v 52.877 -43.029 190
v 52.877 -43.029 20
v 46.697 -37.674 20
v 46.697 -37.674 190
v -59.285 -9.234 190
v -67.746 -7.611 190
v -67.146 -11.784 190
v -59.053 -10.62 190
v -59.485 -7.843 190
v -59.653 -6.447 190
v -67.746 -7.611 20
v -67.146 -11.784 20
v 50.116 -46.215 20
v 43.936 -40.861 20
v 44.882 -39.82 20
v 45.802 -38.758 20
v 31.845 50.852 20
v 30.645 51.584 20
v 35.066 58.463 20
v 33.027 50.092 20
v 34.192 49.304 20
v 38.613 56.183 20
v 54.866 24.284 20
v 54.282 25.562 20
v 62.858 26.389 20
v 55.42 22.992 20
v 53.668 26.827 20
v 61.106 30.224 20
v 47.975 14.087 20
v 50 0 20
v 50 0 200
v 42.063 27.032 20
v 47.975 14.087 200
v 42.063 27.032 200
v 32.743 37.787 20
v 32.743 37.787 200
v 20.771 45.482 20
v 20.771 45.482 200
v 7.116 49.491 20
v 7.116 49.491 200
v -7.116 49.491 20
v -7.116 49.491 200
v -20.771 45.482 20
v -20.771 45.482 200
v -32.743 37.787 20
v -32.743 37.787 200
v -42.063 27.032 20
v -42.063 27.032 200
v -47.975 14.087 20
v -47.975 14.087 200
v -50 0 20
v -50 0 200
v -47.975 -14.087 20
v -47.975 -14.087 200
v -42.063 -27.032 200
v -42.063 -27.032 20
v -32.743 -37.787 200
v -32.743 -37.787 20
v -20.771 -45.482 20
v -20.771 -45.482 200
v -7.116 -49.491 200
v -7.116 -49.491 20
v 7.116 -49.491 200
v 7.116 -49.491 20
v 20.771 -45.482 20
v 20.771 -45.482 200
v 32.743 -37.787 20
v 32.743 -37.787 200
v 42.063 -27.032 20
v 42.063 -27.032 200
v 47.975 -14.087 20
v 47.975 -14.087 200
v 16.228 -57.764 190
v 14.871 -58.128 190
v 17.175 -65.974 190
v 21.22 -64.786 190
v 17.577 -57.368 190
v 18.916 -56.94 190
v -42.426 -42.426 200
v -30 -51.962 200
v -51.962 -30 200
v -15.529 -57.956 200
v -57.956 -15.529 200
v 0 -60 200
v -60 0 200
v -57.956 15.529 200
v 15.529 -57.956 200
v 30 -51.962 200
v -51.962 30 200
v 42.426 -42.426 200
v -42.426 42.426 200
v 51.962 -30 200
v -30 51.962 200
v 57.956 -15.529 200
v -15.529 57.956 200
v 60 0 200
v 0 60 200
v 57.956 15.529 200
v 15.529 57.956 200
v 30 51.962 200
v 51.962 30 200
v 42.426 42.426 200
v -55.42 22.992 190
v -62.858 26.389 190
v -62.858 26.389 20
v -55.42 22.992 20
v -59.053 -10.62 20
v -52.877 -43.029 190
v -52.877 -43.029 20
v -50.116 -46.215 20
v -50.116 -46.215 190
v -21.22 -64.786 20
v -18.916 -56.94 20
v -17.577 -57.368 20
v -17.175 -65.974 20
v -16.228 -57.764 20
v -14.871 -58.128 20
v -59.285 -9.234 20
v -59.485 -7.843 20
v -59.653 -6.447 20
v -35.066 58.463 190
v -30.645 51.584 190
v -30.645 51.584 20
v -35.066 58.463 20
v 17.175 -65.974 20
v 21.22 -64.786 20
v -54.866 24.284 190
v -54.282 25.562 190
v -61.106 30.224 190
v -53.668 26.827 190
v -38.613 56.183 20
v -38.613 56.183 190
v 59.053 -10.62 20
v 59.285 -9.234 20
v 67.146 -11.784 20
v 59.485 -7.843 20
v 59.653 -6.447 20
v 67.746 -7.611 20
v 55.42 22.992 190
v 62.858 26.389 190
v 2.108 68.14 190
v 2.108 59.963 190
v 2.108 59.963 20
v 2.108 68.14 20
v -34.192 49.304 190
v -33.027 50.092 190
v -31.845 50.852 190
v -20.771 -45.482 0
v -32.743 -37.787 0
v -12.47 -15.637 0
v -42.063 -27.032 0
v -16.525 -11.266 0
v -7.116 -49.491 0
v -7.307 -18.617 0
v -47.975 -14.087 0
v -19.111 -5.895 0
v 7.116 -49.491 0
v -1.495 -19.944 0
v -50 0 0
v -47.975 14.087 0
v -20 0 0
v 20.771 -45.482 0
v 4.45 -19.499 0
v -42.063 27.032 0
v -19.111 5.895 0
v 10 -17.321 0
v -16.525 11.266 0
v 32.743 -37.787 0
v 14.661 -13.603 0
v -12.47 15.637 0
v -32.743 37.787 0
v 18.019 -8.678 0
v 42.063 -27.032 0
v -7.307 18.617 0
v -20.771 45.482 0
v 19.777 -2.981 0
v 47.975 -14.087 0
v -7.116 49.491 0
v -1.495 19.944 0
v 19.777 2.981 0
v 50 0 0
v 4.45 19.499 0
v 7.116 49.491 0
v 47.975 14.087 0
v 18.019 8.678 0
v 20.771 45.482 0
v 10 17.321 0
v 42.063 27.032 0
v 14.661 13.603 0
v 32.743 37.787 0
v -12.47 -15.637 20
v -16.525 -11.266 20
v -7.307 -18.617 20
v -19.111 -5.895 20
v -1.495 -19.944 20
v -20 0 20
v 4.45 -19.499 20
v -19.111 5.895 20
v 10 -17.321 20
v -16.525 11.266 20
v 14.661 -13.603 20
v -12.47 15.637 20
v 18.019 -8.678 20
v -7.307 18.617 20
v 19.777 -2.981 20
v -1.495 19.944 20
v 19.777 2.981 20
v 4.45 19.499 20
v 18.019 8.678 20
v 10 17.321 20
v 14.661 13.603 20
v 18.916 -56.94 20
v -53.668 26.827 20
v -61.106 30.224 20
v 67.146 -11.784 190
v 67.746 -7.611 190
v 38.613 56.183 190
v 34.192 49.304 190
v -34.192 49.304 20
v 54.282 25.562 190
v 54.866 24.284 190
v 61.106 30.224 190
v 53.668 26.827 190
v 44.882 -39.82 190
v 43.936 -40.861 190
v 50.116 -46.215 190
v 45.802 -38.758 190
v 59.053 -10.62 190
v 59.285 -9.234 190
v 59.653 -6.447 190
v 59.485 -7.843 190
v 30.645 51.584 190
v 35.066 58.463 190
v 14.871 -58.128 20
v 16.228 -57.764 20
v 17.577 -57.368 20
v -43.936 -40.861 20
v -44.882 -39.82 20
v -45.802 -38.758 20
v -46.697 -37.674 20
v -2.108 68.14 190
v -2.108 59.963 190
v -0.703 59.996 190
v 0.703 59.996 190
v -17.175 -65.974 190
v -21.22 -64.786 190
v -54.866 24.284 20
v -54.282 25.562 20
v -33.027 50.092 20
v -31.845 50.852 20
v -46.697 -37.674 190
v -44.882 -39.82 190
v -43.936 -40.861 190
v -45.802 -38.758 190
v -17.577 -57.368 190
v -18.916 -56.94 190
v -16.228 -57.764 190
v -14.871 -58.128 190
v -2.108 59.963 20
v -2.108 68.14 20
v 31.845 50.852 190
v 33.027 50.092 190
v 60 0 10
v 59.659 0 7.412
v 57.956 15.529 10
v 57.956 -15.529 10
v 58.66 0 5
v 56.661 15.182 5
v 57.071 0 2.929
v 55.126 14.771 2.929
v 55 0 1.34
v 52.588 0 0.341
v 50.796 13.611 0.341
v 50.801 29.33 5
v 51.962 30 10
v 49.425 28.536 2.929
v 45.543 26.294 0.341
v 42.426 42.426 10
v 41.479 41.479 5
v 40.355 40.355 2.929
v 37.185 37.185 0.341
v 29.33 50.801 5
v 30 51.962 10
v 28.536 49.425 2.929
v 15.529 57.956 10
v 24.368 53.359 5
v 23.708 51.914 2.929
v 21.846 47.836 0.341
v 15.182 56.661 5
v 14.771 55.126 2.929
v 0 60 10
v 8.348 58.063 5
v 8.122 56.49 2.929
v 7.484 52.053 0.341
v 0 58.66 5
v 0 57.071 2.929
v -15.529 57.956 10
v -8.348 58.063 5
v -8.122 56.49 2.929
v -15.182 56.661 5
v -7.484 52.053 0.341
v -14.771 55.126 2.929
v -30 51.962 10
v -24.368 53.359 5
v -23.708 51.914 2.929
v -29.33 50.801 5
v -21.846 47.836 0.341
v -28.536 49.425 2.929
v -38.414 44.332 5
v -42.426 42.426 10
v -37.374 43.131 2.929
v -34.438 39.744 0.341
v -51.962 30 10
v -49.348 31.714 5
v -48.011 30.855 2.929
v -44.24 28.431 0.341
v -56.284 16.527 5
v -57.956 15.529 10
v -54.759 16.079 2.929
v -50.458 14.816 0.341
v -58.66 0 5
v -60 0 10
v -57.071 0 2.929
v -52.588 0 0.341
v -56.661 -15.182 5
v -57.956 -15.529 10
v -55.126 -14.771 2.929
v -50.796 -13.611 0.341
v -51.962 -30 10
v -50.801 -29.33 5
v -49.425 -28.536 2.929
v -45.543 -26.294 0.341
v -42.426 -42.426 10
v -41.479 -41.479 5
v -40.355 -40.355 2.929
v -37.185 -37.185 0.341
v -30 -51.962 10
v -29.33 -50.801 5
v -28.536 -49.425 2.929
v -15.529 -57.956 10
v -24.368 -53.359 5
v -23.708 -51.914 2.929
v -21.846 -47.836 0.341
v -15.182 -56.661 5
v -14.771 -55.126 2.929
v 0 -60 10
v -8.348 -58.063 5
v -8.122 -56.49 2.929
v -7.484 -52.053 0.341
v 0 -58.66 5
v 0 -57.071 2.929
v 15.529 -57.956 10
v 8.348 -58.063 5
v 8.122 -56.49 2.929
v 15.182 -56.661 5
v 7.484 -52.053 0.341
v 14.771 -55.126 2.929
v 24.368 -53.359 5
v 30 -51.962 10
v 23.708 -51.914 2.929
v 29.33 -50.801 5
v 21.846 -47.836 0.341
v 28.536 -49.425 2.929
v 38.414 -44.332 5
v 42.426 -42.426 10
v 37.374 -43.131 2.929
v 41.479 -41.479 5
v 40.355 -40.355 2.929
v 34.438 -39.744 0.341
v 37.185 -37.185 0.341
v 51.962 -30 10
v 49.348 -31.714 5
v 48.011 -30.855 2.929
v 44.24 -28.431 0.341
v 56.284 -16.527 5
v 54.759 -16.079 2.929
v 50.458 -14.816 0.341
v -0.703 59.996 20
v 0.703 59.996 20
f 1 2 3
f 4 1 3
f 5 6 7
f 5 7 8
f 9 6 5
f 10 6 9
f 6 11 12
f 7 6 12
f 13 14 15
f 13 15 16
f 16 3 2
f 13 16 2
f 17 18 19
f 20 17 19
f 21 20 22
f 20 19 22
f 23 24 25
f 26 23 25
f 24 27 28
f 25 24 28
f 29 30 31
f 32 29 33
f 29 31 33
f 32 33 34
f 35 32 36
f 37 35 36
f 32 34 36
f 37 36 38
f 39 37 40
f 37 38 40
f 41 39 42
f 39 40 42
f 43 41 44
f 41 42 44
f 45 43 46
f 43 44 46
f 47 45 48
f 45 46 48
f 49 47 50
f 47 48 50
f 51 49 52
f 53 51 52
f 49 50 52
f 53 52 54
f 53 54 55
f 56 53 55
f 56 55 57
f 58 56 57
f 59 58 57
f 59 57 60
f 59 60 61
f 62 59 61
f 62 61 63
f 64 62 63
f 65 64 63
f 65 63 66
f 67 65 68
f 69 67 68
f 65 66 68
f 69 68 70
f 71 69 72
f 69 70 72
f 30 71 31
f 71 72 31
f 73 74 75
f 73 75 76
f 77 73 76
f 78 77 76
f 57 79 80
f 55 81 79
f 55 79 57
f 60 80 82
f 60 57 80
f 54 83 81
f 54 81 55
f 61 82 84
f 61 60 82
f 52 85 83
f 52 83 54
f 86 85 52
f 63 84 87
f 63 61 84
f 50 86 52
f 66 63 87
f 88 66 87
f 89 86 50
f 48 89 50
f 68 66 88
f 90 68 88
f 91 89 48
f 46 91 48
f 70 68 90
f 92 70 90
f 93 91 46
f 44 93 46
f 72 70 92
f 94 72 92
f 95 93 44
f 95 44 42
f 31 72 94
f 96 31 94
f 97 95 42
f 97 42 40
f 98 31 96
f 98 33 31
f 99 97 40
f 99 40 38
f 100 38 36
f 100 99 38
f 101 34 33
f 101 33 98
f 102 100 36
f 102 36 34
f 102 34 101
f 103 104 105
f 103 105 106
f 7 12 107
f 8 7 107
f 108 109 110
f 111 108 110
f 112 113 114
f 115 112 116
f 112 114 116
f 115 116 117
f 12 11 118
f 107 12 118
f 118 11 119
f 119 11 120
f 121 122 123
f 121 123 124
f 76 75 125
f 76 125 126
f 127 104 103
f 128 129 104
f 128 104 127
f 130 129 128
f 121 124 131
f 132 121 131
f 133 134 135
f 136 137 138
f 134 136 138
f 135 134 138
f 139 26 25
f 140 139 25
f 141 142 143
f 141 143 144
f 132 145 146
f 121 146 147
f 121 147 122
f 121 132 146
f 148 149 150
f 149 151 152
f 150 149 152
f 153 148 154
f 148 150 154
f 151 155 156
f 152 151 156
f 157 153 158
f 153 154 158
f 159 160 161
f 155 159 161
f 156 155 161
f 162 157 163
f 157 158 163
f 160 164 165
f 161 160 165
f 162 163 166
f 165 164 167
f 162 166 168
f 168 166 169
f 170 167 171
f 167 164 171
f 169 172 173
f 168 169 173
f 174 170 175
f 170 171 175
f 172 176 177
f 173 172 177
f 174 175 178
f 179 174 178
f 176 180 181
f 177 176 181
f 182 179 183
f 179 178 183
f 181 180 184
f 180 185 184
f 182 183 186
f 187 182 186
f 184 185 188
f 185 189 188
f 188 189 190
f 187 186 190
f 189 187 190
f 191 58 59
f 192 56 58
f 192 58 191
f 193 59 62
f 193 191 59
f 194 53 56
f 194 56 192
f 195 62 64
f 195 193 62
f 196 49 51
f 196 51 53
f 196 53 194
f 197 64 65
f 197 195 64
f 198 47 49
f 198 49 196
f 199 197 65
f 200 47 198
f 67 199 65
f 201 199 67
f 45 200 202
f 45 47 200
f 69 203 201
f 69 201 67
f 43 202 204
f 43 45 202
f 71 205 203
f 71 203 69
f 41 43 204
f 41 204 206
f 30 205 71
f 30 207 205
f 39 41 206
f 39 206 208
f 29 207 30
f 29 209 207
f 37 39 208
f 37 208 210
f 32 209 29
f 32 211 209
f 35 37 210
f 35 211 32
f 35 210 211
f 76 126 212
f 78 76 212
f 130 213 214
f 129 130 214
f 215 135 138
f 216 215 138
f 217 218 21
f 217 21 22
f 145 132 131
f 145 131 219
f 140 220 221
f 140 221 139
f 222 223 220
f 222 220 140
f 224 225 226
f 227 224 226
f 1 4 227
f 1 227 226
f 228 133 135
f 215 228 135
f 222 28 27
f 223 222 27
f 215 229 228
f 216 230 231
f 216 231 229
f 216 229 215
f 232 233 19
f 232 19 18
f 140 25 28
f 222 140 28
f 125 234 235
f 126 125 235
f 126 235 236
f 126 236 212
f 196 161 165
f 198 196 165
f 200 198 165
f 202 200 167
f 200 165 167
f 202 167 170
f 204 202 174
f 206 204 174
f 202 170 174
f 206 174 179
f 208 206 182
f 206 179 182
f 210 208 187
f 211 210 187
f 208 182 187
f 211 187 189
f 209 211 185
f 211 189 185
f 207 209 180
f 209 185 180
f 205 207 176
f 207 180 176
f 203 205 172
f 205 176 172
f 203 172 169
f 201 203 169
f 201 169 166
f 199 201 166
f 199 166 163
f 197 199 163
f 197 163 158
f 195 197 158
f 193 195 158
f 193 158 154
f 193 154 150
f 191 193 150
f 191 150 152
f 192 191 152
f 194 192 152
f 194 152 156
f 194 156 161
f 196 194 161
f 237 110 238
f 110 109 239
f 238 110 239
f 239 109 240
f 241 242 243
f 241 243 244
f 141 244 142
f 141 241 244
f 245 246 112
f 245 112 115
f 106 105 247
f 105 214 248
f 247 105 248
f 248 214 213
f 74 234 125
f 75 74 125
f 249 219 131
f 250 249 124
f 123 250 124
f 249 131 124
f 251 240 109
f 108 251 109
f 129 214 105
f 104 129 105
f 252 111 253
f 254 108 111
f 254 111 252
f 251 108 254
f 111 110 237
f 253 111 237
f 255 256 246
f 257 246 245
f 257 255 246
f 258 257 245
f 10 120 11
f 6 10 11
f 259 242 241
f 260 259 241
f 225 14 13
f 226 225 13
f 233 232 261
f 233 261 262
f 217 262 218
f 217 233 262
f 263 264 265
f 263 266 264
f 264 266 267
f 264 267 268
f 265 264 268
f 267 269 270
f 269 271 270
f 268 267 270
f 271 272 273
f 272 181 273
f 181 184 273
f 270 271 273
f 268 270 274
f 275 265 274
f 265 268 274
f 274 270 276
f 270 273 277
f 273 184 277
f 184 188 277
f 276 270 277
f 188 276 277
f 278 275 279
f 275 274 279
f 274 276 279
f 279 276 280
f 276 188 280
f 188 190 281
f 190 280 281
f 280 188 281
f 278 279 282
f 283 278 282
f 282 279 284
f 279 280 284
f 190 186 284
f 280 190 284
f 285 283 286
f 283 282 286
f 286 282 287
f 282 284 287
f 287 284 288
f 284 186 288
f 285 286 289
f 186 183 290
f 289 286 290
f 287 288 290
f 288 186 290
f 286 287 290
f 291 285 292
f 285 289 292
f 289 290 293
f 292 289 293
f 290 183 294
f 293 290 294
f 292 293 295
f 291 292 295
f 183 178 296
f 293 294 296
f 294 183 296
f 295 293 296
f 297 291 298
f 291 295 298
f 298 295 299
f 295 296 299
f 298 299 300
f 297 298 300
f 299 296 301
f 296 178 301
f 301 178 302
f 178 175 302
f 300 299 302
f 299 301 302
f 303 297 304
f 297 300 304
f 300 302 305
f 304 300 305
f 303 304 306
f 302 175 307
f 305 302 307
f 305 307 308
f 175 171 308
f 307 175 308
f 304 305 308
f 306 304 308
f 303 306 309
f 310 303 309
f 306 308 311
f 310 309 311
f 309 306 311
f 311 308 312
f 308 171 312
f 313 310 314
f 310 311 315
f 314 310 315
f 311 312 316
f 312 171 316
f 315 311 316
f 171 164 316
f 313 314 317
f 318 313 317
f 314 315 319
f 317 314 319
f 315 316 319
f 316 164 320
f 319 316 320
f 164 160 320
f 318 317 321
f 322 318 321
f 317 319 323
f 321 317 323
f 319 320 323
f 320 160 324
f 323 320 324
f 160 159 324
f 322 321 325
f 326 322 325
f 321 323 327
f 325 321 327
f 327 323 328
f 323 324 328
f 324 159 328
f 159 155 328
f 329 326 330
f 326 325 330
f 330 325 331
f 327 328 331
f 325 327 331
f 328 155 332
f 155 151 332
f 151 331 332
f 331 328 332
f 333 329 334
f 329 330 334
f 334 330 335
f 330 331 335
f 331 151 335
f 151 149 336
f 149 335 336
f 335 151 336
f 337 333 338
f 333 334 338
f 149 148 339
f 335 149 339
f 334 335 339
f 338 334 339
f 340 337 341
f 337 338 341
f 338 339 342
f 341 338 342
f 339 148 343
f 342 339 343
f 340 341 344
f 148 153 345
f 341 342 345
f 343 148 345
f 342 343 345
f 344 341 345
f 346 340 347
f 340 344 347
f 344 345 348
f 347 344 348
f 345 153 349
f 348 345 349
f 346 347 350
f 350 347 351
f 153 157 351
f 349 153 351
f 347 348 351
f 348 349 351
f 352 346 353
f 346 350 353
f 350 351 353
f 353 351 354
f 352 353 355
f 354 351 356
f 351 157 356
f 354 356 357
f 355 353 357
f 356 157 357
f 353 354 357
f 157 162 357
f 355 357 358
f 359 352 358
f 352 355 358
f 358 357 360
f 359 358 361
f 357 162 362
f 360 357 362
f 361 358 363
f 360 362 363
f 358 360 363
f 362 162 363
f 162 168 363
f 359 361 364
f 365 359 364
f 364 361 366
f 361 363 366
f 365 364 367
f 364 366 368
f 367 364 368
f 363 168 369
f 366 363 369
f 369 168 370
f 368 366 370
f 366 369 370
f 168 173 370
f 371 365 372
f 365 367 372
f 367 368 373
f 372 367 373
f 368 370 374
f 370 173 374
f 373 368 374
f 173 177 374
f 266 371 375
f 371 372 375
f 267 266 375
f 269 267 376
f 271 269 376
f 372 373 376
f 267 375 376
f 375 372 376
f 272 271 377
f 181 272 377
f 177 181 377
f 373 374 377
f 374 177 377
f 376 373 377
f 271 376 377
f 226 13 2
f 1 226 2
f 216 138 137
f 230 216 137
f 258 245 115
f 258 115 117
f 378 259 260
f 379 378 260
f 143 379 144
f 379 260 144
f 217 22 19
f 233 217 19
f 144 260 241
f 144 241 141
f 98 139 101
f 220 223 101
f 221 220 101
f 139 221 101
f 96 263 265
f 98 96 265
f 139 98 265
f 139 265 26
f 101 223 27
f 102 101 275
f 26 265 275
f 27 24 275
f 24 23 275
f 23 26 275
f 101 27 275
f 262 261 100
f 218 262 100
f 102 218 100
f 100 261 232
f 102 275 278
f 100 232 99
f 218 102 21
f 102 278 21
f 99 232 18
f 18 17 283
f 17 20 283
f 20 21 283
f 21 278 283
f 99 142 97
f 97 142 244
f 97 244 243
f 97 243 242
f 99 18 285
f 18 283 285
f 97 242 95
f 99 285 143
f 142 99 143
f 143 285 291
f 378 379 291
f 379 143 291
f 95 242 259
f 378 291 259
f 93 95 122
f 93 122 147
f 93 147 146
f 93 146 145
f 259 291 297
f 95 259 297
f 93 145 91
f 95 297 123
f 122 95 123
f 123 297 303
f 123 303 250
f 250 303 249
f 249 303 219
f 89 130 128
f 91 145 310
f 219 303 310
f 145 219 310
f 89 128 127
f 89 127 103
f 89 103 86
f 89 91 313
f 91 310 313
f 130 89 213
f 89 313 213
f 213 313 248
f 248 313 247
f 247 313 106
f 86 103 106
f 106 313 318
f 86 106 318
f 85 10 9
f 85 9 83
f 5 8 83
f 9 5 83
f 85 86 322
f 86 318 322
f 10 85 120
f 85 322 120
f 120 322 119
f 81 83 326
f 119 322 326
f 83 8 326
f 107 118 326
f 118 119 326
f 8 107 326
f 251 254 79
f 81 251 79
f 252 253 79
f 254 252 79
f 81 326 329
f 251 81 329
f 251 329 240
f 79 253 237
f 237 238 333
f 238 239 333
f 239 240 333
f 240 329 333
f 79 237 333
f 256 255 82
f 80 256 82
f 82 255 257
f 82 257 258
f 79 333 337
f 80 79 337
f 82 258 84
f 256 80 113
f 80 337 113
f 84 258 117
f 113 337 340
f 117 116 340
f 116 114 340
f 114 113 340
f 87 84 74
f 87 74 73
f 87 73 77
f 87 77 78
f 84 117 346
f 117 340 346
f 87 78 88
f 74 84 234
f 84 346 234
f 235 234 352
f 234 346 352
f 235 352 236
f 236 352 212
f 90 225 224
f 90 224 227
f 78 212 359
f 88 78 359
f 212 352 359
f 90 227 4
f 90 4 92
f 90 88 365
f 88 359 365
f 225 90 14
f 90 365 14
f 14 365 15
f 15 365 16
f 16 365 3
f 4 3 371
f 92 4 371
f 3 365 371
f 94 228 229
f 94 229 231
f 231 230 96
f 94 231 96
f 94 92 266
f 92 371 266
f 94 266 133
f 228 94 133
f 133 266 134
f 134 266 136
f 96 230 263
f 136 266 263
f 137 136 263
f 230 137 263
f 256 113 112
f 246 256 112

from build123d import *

# Parameters (mm, degrees)
SKETCH1_R           = 60
BOSS_EXTRUDE1_DEPTH = 200
SKETCH2_R           = 50
CUT_EXTRUDE1_DEPTH  = 180
FILLET1_R           = 10
SKETCH3_W           = 4.216139726
SKETCH3_H           = 8.515044219
BOSS_EXTRUDE2_DEPTH = 170
SKETCH4_R           = 20
CUT_EXTRUDE3_DEPTH  = 25


with BuildPart() as part:
    # Sketch1 → Boss-Extrude1 (new body)
    with BuildSketch(Plane.XY):
        Circle(SKETCH1_R)
    extrude(amount=BOSS_EXTRUDE1_DEPTH)

    # Sketch2 → Cut-Extrude1 (cut)
    with BuildSketch(Plane.XY.offset(200)):
        Circle(SKETCH2_R)
    extrude(amount=-CUT_EXTRUDE1_DEPTH, mode=Mode.SUBTRACT)

    # Fillet1
    fillet1_edges = [part.edges().sort_by_distance(p)[0] for p in [
        (-60, 0, 0),
    ]]
    fillet(fillet1_edges, radius=FILLET1_R)

    # Sketch3 → Boss-Extrude2 (add)
    with BuildSketch(Plane.XY.offset(20)):
        with Locations((0, 63.882225371)):
            Rectangle(SKETCH3_W, SKETCH3_H)
        Polygon((34.008969531, 49.019783649), (38.612549999, 56.18309468), (35.065707559, 58.462511908), (30.462127092, 51.299200877), align=None)
        Polygon((55.11226167, 22.851429085), (62.857818333, 26.38870629), (61.106370594, 30.223841881), (53.360813931, 26.686564676), align=None)
        Polygon((58.717800132, -10.572092753), (67.146173479, -11.783909894), (67.746192722, -7.610684391), (59.317819375, -6.39886725), align=None)
        Polygon((43.680851933, -40.639049841), (50.116092977, -46.215217947), (52.877077332, -43.028872144), (46.441836288, -37.452704037), align=None)
        Polygon((14.775541879, -57.803395746), (17.174507059, -65.973520844), (21.219863501, -64.785697019), (18.820898322, -56.615571921), align=None)
        Polygon((-18.820898322, -56.615571921), (-21.219863501, -64.785697019), (-17.174507059, -65.973520844), (-14.775541879, -57.803395746), align=None)
        Polygon((-46.441836288, -37.452704037), (-52.877077332, -43.028872144), (-50.116092977, -46.215217947), (-43.680851933, -40.639049841), align=None)
        Polygon((-59.317819375, -6.39886725), (-67.746192722, -7.610684391), (-67.146173479, -11.783909894), (-58.717800132, -10.572092753), align=None)
        Polygon((-53.360813931, 26.686564676), (-61.106370594, 30.223841881), (-62.857818333, 26.38870629), (-55.11226167, 22.851429085), align=None)
        Polygon((-30.462127092, 51.299200877), (-35.065707559, 58.462511908), (-38.612549999, 56.18309468), (-34.008969531, 49.019783649), align=None)
    extrude(amount=BOSS_EXTRUDE2_DEPTH)

    # Sketch4 → Cut-Extrude3 (cut)
    with BuildSketch(Plane(origin=(0, 0, 0), x_dir=(-1, 0, 0), z_dir=(0, 0, -1))):
        Circle(SKETCH4_R)
    extrude(amount=-CUT_EXTRUDE3_DEPTH, mode=Mode.SUBTRACT)


solid = part.part
